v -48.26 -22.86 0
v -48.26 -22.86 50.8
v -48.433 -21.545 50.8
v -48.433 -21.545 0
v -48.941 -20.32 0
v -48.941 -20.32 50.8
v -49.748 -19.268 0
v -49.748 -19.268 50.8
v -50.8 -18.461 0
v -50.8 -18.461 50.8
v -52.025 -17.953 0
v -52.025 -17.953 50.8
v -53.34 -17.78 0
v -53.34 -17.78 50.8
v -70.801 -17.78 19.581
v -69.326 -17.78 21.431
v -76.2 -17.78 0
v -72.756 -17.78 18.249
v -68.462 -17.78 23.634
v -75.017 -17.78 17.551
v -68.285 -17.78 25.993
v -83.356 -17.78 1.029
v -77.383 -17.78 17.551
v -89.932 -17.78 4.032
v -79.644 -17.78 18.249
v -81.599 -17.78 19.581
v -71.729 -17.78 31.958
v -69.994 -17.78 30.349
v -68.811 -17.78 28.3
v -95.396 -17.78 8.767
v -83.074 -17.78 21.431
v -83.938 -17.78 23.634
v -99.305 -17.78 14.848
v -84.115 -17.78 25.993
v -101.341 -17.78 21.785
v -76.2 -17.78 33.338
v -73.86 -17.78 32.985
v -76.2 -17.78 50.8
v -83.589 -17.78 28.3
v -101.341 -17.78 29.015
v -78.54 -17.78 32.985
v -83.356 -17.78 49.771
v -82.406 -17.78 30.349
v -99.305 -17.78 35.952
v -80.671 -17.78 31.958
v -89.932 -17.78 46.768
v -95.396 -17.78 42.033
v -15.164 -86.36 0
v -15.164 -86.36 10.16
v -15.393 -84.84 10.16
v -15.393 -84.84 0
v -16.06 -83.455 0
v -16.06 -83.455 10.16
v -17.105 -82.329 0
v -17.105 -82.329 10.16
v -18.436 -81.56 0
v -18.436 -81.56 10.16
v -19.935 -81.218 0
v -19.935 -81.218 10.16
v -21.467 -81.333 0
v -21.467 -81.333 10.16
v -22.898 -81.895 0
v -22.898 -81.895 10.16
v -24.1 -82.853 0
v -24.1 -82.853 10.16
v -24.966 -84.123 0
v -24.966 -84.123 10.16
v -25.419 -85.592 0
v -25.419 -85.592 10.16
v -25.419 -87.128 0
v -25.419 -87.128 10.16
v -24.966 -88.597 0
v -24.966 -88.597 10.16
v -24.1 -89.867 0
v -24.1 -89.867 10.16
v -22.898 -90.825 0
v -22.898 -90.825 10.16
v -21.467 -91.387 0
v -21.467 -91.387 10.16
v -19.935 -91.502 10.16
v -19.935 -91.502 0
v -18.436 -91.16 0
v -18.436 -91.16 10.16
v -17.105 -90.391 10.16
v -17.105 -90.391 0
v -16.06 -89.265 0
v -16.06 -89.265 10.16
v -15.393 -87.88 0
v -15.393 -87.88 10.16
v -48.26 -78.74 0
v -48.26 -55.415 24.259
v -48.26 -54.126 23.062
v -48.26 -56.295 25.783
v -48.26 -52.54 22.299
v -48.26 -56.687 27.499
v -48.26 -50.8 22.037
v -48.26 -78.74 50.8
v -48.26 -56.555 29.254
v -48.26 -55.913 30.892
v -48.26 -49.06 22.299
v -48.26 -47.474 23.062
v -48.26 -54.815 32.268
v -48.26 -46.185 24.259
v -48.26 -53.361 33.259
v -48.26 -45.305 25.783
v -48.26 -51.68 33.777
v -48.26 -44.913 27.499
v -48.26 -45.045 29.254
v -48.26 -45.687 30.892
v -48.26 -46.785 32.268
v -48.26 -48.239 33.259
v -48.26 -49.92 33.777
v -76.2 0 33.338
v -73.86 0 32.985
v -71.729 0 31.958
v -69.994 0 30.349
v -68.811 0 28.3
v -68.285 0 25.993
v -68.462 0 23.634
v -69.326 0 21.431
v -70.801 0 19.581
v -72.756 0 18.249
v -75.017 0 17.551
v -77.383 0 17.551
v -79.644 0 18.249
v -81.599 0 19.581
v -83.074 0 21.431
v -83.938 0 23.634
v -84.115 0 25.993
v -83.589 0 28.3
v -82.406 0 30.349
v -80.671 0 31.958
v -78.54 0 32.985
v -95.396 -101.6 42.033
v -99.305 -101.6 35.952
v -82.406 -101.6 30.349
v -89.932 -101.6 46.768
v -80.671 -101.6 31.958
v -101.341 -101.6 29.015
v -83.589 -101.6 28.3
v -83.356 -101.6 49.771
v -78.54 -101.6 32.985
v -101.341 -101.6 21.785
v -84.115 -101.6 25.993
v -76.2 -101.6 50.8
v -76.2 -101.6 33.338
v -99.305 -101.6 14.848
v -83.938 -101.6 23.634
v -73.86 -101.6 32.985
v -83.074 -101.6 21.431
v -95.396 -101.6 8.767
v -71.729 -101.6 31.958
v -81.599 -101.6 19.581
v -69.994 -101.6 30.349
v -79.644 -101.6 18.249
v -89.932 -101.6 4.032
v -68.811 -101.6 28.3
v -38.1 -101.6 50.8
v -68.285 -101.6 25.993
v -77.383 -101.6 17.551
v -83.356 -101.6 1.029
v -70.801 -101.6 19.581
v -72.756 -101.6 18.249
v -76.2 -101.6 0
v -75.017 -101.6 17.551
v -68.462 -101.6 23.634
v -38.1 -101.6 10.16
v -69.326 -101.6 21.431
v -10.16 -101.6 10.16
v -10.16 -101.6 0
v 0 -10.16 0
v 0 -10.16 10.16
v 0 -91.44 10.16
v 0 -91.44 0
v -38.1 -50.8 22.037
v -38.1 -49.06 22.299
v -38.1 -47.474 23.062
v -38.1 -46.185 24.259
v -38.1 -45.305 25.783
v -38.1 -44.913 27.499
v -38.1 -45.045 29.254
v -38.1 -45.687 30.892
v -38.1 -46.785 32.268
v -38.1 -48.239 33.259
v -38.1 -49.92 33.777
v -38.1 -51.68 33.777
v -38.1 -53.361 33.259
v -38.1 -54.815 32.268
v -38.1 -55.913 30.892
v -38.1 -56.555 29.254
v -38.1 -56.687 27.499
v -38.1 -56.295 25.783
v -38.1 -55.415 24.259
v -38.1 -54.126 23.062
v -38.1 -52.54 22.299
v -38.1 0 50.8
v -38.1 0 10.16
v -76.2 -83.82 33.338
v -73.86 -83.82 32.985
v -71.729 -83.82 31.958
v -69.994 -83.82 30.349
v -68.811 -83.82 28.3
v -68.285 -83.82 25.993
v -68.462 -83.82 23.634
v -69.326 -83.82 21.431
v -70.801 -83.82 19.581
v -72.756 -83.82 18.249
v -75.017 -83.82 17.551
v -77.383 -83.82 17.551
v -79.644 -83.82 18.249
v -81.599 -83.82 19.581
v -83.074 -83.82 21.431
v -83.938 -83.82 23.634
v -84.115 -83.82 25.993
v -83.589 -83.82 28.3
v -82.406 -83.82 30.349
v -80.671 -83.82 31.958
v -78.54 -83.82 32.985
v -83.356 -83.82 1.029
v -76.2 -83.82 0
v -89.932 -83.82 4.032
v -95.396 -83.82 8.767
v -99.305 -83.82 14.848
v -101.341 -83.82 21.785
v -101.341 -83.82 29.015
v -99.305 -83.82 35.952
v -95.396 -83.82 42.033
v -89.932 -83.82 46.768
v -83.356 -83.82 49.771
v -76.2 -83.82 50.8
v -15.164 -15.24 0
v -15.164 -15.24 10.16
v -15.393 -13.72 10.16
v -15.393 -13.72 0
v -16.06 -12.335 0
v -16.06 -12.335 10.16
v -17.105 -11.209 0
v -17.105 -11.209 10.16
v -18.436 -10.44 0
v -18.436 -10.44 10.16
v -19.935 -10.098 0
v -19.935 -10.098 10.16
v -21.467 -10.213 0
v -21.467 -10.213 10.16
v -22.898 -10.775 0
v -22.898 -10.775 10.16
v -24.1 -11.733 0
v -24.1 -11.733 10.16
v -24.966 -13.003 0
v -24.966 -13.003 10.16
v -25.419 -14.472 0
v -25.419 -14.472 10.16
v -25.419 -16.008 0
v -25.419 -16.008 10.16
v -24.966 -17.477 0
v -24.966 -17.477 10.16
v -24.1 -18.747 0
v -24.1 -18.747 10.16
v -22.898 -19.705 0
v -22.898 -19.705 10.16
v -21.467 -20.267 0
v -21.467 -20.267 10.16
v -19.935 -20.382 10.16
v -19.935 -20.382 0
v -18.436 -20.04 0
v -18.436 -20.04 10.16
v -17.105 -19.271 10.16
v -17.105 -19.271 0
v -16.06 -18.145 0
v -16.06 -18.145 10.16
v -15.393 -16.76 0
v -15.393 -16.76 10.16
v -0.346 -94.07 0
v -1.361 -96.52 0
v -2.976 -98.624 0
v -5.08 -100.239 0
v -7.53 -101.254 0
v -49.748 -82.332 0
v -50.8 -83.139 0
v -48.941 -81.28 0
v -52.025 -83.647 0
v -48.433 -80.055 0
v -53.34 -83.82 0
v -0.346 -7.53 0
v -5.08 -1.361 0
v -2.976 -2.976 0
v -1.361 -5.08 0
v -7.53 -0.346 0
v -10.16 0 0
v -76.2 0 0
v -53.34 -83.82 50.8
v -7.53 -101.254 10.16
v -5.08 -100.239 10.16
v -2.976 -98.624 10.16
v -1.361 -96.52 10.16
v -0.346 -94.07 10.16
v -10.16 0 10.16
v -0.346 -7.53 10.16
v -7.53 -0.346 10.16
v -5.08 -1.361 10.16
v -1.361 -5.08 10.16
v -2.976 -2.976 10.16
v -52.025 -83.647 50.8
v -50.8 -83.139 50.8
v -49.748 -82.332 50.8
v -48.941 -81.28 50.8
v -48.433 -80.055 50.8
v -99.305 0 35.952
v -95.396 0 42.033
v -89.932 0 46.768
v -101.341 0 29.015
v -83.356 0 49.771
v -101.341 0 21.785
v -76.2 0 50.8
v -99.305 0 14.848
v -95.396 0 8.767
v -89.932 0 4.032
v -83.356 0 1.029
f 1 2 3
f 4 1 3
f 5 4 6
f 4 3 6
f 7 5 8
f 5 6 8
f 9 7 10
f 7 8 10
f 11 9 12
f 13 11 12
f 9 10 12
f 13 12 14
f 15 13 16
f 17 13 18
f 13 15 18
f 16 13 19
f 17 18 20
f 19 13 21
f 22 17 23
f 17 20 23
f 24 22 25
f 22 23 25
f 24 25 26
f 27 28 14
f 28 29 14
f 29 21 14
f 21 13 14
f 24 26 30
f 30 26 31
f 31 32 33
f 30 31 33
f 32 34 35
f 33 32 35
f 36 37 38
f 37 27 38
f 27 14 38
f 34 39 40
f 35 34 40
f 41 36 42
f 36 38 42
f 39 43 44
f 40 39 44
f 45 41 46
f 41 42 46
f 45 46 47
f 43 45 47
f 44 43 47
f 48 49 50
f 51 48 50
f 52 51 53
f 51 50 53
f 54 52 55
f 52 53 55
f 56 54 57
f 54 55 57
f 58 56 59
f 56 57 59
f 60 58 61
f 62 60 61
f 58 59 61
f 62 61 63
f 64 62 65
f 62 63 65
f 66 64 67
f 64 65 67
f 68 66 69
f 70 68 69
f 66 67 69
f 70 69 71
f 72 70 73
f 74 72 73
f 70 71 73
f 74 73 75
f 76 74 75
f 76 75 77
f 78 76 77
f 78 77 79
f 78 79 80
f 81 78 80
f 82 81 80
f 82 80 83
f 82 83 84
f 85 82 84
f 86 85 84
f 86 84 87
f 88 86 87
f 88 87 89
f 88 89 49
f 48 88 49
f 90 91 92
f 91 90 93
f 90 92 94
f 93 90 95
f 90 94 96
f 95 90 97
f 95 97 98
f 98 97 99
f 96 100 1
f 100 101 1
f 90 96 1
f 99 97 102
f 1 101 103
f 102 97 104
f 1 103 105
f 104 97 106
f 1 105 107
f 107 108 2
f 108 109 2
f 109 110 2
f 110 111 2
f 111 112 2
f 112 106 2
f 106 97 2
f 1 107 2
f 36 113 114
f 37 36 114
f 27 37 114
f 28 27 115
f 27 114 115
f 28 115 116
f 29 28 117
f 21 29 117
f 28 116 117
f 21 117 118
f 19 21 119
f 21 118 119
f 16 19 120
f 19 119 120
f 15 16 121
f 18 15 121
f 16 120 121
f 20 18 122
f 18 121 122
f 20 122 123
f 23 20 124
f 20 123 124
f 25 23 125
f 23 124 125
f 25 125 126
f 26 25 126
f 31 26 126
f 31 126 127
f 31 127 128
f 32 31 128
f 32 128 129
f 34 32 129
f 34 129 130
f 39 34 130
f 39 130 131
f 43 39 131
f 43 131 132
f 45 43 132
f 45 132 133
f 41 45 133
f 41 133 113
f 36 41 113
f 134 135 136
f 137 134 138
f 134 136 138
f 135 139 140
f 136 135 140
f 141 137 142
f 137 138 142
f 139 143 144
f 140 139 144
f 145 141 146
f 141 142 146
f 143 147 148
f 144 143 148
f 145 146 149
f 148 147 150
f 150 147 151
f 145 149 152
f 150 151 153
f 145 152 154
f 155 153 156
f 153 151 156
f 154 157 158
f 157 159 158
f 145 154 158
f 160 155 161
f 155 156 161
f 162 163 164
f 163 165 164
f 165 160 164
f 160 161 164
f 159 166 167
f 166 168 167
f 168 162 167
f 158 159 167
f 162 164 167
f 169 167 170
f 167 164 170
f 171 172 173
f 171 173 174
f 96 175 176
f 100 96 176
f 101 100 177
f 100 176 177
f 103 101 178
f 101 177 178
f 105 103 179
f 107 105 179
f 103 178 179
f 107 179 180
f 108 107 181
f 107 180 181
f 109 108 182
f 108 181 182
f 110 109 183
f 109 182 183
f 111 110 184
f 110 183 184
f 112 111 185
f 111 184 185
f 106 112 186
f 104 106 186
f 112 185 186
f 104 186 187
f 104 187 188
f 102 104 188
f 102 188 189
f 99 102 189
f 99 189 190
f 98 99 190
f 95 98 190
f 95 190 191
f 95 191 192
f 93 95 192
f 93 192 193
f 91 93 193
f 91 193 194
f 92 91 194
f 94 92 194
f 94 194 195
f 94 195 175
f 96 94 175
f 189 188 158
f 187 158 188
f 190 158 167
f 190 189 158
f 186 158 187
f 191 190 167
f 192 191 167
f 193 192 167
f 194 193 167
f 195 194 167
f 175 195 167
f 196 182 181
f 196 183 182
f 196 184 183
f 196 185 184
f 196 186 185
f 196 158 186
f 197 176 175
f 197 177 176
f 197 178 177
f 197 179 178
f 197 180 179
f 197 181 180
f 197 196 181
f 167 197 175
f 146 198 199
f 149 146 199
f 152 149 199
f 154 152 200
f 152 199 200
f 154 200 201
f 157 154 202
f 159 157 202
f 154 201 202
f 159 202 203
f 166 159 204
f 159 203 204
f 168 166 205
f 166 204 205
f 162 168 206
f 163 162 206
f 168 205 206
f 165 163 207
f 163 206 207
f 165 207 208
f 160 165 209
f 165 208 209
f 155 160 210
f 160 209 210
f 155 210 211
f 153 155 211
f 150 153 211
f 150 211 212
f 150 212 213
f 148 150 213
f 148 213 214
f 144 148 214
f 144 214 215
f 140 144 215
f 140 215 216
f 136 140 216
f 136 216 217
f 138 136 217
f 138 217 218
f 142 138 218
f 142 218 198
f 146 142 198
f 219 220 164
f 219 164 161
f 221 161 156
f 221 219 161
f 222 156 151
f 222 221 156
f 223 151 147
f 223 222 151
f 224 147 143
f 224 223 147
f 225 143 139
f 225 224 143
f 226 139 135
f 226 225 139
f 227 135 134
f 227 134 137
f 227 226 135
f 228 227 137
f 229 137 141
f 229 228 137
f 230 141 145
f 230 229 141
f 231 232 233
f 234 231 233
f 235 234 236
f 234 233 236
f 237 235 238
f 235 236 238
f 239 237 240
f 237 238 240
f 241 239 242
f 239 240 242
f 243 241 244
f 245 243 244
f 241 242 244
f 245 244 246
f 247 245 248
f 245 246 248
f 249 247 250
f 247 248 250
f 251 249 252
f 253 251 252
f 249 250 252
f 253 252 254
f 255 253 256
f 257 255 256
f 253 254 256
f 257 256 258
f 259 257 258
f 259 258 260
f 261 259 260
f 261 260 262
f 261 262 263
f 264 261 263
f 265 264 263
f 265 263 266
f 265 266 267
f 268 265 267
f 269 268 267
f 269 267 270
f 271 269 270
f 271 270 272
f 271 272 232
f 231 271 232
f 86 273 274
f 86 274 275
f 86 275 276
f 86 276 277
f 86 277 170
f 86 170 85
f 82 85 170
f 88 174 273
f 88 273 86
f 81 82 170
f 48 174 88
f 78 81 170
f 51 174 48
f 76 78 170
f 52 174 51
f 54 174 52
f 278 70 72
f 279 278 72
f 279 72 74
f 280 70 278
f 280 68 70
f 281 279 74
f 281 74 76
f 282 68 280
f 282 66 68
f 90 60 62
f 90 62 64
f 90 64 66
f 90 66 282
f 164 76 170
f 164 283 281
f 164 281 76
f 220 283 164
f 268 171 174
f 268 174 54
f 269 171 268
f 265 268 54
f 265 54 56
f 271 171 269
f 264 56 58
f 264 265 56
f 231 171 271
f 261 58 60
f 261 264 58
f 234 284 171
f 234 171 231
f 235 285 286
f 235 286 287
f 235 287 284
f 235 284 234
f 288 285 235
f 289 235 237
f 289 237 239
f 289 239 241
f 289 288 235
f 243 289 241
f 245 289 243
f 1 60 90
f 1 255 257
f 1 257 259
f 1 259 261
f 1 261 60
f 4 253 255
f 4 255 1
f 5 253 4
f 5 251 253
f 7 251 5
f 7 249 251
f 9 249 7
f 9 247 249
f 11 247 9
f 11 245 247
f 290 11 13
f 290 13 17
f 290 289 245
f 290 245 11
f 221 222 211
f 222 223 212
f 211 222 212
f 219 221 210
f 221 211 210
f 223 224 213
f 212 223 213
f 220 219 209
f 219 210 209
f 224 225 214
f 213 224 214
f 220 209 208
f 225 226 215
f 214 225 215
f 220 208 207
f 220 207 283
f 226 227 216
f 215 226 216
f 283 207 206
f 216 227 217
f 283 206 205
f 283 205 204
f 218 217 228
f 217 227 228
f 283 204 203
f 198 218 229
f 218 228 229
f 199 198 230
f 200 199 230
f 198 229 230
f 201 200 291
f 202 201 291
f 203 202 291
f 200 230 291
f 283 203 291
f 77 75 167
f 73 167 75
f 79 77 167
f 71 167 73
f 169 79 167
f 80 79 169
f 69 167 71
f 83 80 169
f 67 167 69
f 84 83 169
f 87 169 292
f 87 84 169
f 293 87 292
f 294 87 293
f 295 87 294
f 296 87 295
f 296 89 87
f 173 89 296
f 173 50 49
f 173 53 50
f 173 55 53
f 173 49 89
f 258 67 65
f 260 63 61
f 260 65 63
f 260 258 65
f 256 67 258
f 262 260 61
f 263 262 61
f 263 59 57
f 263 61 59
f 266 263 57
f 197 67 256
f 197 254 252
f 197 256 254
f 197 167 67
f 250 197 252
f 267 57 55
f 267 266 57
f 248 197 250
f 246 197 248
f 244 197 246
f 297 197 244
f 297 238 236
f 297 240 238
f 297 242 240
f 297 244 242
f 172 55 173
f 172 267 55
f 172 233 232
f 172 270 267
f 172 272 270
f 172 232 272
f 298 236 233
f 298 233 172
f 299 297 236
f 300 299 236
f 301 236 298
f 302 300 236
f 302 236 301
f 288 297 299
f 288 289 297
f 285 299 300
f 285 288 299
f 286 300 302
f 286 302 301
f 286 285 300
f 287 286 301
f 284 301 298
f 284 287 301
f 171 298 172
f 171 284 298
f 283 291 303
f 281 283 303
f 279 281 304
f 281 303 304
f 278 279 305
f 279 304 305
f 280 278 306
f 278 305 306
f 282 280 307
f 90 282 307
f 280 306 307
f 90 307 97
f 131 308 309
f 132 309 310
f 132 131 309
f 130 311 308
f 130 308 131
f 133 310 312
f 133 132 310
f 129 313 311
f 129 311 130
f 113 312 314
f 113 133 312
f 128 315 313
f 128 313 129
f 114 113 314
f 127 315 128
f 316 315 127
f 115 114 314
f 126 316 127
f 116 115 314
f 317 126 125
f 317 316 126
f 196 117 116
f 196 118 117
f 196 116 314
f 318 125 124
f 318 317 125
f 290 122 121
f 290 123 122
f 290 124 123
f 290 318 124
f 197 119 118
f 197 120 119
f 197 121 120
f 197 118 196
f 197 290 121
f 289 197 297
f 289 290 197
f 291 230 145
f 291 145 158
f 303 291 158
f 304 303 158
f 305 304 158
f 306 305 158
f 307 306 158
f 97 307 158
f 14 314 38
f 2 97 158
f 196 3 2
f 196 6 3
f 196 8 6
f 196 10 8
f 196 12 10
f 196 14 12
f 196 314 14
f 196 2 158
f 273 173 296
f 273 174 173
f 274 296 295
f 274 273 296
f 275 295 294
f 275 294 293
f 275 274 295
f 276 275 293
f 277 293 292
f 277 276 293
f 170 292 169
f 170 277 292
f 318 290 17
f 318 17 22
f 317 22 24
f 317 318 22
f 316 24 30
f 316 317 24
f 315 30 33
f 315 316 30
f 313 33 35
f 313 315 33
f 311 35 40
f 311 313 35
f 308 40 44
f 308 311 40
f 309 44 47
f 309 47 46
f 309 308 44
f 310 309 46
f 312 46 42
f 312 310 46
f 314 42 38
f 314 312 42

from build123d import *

# Parameters (mm, degrees)
SKETCH1_R           = 7.9375
BOSS_EXTRUDE1_DEPTH = 101.6
CUT_EXTRUDE1_DEPTH  = 153.4
SKETCH3_R           = 5.1562
CUT_EXTRUDE2_DEPTH  = 150.32089472
SKETCH4_R           = 5.903408011
CUT_EXTRUDE3_DEPTH  = 131.136274728
FILLET1_R           = 10.16


with BuildPart() as part:
    # Sketch1 → Boss-Extrude1 (new body)
    with BuildSketch(Plane(origin=(0, 0, 0), x_dir=(1, 0, 0), z_dir=(0, 1, 0))):
        with BuildLine():
            Line((0, 0), (-76.2, 0))
            ThreePointArc((-76.2, 0), (-101.6, -25.4), (-76.2, -50.8))
            Line((-76.2, -50.8), (-38.1, -50.8))
            Line((-38.1, -50.8), (-38.1, -10.16))
            Line((-38.1, -10.16), (0, -10.16))
            Line((0, -10.16), (0, 0))
        make_face()
        with Locations(Location((-76.2, -25.4, 0), (0, 0, 270))):
            Circle(SKETCH1_R, mode=Mode.SUBTRACT)
    extrude(amount=-BOSS_EXTRUDE1_DEPTH)

    # Sketch2 → Cut-Extrude1 (cut, through all)
    with BuildSketch(Plane.XY.offset(50.8)):
        with BuildLine():
            Line((-53.34, -17.78), (-111.029892198, -17.78))
            Line((-111.029892198, -17.78), (-111.029892198, -83.82))
            Line((-111.029892198, -83.82), (-53.34, -83.82))
            ThreePointArc((-53.34, -83.82), (-49.747897552, -82.332102448), (-48.26, -78.74))
            Line((-48.26, -78.74), (-48.26, -22.86))
            ThreePointArc((-48.26, -22.86), (-49.747897552, -19.267897552), (-53.34, -17.78))
        make_face()
    extrude(amount=-CUT_EXTRUDE1_DEPTH, mode=Mode.SUBTRACT)

    # Sketch3 → Cut-Extrude2 (cut, through all)
    with BuildSketch(Plane.XY.offset(10.16)):
        with Locations((-20.32, -15.24)):
            Circle(SKETCH3_R)
        with Locations((-20.32, -86.36)):
            Circle(SKETCH3_R)
    extrude(amount=-CUT_EXTRUDE2_DEPTH, mode=Mode.SUBTRACT)

    # Sketch4 → Cut-Extrude3 (cut, through all)
    with BuildSketch(Plane(origin=(-38.1, 0, 0), x_dir=(0, 0, -1), z_dir=(1, 0, 0))):
        with Locations((-27.94, -50.8)):
            Circle(SKETCH4_R)
    extrude(amount=-CUT_EXTRUDE3_DEPTH, mode=Mode.SUBTRACT)

    # Fillet1
    fillet1_edges = [part.edges().sort_by_distance(p)[0] for p in [
        (0, -101.6, 5.08),
        (0, 0, 5.08),
    ]]
    fillet(fillet1_edges, radius=FILLET1_R)


solid = part.part
